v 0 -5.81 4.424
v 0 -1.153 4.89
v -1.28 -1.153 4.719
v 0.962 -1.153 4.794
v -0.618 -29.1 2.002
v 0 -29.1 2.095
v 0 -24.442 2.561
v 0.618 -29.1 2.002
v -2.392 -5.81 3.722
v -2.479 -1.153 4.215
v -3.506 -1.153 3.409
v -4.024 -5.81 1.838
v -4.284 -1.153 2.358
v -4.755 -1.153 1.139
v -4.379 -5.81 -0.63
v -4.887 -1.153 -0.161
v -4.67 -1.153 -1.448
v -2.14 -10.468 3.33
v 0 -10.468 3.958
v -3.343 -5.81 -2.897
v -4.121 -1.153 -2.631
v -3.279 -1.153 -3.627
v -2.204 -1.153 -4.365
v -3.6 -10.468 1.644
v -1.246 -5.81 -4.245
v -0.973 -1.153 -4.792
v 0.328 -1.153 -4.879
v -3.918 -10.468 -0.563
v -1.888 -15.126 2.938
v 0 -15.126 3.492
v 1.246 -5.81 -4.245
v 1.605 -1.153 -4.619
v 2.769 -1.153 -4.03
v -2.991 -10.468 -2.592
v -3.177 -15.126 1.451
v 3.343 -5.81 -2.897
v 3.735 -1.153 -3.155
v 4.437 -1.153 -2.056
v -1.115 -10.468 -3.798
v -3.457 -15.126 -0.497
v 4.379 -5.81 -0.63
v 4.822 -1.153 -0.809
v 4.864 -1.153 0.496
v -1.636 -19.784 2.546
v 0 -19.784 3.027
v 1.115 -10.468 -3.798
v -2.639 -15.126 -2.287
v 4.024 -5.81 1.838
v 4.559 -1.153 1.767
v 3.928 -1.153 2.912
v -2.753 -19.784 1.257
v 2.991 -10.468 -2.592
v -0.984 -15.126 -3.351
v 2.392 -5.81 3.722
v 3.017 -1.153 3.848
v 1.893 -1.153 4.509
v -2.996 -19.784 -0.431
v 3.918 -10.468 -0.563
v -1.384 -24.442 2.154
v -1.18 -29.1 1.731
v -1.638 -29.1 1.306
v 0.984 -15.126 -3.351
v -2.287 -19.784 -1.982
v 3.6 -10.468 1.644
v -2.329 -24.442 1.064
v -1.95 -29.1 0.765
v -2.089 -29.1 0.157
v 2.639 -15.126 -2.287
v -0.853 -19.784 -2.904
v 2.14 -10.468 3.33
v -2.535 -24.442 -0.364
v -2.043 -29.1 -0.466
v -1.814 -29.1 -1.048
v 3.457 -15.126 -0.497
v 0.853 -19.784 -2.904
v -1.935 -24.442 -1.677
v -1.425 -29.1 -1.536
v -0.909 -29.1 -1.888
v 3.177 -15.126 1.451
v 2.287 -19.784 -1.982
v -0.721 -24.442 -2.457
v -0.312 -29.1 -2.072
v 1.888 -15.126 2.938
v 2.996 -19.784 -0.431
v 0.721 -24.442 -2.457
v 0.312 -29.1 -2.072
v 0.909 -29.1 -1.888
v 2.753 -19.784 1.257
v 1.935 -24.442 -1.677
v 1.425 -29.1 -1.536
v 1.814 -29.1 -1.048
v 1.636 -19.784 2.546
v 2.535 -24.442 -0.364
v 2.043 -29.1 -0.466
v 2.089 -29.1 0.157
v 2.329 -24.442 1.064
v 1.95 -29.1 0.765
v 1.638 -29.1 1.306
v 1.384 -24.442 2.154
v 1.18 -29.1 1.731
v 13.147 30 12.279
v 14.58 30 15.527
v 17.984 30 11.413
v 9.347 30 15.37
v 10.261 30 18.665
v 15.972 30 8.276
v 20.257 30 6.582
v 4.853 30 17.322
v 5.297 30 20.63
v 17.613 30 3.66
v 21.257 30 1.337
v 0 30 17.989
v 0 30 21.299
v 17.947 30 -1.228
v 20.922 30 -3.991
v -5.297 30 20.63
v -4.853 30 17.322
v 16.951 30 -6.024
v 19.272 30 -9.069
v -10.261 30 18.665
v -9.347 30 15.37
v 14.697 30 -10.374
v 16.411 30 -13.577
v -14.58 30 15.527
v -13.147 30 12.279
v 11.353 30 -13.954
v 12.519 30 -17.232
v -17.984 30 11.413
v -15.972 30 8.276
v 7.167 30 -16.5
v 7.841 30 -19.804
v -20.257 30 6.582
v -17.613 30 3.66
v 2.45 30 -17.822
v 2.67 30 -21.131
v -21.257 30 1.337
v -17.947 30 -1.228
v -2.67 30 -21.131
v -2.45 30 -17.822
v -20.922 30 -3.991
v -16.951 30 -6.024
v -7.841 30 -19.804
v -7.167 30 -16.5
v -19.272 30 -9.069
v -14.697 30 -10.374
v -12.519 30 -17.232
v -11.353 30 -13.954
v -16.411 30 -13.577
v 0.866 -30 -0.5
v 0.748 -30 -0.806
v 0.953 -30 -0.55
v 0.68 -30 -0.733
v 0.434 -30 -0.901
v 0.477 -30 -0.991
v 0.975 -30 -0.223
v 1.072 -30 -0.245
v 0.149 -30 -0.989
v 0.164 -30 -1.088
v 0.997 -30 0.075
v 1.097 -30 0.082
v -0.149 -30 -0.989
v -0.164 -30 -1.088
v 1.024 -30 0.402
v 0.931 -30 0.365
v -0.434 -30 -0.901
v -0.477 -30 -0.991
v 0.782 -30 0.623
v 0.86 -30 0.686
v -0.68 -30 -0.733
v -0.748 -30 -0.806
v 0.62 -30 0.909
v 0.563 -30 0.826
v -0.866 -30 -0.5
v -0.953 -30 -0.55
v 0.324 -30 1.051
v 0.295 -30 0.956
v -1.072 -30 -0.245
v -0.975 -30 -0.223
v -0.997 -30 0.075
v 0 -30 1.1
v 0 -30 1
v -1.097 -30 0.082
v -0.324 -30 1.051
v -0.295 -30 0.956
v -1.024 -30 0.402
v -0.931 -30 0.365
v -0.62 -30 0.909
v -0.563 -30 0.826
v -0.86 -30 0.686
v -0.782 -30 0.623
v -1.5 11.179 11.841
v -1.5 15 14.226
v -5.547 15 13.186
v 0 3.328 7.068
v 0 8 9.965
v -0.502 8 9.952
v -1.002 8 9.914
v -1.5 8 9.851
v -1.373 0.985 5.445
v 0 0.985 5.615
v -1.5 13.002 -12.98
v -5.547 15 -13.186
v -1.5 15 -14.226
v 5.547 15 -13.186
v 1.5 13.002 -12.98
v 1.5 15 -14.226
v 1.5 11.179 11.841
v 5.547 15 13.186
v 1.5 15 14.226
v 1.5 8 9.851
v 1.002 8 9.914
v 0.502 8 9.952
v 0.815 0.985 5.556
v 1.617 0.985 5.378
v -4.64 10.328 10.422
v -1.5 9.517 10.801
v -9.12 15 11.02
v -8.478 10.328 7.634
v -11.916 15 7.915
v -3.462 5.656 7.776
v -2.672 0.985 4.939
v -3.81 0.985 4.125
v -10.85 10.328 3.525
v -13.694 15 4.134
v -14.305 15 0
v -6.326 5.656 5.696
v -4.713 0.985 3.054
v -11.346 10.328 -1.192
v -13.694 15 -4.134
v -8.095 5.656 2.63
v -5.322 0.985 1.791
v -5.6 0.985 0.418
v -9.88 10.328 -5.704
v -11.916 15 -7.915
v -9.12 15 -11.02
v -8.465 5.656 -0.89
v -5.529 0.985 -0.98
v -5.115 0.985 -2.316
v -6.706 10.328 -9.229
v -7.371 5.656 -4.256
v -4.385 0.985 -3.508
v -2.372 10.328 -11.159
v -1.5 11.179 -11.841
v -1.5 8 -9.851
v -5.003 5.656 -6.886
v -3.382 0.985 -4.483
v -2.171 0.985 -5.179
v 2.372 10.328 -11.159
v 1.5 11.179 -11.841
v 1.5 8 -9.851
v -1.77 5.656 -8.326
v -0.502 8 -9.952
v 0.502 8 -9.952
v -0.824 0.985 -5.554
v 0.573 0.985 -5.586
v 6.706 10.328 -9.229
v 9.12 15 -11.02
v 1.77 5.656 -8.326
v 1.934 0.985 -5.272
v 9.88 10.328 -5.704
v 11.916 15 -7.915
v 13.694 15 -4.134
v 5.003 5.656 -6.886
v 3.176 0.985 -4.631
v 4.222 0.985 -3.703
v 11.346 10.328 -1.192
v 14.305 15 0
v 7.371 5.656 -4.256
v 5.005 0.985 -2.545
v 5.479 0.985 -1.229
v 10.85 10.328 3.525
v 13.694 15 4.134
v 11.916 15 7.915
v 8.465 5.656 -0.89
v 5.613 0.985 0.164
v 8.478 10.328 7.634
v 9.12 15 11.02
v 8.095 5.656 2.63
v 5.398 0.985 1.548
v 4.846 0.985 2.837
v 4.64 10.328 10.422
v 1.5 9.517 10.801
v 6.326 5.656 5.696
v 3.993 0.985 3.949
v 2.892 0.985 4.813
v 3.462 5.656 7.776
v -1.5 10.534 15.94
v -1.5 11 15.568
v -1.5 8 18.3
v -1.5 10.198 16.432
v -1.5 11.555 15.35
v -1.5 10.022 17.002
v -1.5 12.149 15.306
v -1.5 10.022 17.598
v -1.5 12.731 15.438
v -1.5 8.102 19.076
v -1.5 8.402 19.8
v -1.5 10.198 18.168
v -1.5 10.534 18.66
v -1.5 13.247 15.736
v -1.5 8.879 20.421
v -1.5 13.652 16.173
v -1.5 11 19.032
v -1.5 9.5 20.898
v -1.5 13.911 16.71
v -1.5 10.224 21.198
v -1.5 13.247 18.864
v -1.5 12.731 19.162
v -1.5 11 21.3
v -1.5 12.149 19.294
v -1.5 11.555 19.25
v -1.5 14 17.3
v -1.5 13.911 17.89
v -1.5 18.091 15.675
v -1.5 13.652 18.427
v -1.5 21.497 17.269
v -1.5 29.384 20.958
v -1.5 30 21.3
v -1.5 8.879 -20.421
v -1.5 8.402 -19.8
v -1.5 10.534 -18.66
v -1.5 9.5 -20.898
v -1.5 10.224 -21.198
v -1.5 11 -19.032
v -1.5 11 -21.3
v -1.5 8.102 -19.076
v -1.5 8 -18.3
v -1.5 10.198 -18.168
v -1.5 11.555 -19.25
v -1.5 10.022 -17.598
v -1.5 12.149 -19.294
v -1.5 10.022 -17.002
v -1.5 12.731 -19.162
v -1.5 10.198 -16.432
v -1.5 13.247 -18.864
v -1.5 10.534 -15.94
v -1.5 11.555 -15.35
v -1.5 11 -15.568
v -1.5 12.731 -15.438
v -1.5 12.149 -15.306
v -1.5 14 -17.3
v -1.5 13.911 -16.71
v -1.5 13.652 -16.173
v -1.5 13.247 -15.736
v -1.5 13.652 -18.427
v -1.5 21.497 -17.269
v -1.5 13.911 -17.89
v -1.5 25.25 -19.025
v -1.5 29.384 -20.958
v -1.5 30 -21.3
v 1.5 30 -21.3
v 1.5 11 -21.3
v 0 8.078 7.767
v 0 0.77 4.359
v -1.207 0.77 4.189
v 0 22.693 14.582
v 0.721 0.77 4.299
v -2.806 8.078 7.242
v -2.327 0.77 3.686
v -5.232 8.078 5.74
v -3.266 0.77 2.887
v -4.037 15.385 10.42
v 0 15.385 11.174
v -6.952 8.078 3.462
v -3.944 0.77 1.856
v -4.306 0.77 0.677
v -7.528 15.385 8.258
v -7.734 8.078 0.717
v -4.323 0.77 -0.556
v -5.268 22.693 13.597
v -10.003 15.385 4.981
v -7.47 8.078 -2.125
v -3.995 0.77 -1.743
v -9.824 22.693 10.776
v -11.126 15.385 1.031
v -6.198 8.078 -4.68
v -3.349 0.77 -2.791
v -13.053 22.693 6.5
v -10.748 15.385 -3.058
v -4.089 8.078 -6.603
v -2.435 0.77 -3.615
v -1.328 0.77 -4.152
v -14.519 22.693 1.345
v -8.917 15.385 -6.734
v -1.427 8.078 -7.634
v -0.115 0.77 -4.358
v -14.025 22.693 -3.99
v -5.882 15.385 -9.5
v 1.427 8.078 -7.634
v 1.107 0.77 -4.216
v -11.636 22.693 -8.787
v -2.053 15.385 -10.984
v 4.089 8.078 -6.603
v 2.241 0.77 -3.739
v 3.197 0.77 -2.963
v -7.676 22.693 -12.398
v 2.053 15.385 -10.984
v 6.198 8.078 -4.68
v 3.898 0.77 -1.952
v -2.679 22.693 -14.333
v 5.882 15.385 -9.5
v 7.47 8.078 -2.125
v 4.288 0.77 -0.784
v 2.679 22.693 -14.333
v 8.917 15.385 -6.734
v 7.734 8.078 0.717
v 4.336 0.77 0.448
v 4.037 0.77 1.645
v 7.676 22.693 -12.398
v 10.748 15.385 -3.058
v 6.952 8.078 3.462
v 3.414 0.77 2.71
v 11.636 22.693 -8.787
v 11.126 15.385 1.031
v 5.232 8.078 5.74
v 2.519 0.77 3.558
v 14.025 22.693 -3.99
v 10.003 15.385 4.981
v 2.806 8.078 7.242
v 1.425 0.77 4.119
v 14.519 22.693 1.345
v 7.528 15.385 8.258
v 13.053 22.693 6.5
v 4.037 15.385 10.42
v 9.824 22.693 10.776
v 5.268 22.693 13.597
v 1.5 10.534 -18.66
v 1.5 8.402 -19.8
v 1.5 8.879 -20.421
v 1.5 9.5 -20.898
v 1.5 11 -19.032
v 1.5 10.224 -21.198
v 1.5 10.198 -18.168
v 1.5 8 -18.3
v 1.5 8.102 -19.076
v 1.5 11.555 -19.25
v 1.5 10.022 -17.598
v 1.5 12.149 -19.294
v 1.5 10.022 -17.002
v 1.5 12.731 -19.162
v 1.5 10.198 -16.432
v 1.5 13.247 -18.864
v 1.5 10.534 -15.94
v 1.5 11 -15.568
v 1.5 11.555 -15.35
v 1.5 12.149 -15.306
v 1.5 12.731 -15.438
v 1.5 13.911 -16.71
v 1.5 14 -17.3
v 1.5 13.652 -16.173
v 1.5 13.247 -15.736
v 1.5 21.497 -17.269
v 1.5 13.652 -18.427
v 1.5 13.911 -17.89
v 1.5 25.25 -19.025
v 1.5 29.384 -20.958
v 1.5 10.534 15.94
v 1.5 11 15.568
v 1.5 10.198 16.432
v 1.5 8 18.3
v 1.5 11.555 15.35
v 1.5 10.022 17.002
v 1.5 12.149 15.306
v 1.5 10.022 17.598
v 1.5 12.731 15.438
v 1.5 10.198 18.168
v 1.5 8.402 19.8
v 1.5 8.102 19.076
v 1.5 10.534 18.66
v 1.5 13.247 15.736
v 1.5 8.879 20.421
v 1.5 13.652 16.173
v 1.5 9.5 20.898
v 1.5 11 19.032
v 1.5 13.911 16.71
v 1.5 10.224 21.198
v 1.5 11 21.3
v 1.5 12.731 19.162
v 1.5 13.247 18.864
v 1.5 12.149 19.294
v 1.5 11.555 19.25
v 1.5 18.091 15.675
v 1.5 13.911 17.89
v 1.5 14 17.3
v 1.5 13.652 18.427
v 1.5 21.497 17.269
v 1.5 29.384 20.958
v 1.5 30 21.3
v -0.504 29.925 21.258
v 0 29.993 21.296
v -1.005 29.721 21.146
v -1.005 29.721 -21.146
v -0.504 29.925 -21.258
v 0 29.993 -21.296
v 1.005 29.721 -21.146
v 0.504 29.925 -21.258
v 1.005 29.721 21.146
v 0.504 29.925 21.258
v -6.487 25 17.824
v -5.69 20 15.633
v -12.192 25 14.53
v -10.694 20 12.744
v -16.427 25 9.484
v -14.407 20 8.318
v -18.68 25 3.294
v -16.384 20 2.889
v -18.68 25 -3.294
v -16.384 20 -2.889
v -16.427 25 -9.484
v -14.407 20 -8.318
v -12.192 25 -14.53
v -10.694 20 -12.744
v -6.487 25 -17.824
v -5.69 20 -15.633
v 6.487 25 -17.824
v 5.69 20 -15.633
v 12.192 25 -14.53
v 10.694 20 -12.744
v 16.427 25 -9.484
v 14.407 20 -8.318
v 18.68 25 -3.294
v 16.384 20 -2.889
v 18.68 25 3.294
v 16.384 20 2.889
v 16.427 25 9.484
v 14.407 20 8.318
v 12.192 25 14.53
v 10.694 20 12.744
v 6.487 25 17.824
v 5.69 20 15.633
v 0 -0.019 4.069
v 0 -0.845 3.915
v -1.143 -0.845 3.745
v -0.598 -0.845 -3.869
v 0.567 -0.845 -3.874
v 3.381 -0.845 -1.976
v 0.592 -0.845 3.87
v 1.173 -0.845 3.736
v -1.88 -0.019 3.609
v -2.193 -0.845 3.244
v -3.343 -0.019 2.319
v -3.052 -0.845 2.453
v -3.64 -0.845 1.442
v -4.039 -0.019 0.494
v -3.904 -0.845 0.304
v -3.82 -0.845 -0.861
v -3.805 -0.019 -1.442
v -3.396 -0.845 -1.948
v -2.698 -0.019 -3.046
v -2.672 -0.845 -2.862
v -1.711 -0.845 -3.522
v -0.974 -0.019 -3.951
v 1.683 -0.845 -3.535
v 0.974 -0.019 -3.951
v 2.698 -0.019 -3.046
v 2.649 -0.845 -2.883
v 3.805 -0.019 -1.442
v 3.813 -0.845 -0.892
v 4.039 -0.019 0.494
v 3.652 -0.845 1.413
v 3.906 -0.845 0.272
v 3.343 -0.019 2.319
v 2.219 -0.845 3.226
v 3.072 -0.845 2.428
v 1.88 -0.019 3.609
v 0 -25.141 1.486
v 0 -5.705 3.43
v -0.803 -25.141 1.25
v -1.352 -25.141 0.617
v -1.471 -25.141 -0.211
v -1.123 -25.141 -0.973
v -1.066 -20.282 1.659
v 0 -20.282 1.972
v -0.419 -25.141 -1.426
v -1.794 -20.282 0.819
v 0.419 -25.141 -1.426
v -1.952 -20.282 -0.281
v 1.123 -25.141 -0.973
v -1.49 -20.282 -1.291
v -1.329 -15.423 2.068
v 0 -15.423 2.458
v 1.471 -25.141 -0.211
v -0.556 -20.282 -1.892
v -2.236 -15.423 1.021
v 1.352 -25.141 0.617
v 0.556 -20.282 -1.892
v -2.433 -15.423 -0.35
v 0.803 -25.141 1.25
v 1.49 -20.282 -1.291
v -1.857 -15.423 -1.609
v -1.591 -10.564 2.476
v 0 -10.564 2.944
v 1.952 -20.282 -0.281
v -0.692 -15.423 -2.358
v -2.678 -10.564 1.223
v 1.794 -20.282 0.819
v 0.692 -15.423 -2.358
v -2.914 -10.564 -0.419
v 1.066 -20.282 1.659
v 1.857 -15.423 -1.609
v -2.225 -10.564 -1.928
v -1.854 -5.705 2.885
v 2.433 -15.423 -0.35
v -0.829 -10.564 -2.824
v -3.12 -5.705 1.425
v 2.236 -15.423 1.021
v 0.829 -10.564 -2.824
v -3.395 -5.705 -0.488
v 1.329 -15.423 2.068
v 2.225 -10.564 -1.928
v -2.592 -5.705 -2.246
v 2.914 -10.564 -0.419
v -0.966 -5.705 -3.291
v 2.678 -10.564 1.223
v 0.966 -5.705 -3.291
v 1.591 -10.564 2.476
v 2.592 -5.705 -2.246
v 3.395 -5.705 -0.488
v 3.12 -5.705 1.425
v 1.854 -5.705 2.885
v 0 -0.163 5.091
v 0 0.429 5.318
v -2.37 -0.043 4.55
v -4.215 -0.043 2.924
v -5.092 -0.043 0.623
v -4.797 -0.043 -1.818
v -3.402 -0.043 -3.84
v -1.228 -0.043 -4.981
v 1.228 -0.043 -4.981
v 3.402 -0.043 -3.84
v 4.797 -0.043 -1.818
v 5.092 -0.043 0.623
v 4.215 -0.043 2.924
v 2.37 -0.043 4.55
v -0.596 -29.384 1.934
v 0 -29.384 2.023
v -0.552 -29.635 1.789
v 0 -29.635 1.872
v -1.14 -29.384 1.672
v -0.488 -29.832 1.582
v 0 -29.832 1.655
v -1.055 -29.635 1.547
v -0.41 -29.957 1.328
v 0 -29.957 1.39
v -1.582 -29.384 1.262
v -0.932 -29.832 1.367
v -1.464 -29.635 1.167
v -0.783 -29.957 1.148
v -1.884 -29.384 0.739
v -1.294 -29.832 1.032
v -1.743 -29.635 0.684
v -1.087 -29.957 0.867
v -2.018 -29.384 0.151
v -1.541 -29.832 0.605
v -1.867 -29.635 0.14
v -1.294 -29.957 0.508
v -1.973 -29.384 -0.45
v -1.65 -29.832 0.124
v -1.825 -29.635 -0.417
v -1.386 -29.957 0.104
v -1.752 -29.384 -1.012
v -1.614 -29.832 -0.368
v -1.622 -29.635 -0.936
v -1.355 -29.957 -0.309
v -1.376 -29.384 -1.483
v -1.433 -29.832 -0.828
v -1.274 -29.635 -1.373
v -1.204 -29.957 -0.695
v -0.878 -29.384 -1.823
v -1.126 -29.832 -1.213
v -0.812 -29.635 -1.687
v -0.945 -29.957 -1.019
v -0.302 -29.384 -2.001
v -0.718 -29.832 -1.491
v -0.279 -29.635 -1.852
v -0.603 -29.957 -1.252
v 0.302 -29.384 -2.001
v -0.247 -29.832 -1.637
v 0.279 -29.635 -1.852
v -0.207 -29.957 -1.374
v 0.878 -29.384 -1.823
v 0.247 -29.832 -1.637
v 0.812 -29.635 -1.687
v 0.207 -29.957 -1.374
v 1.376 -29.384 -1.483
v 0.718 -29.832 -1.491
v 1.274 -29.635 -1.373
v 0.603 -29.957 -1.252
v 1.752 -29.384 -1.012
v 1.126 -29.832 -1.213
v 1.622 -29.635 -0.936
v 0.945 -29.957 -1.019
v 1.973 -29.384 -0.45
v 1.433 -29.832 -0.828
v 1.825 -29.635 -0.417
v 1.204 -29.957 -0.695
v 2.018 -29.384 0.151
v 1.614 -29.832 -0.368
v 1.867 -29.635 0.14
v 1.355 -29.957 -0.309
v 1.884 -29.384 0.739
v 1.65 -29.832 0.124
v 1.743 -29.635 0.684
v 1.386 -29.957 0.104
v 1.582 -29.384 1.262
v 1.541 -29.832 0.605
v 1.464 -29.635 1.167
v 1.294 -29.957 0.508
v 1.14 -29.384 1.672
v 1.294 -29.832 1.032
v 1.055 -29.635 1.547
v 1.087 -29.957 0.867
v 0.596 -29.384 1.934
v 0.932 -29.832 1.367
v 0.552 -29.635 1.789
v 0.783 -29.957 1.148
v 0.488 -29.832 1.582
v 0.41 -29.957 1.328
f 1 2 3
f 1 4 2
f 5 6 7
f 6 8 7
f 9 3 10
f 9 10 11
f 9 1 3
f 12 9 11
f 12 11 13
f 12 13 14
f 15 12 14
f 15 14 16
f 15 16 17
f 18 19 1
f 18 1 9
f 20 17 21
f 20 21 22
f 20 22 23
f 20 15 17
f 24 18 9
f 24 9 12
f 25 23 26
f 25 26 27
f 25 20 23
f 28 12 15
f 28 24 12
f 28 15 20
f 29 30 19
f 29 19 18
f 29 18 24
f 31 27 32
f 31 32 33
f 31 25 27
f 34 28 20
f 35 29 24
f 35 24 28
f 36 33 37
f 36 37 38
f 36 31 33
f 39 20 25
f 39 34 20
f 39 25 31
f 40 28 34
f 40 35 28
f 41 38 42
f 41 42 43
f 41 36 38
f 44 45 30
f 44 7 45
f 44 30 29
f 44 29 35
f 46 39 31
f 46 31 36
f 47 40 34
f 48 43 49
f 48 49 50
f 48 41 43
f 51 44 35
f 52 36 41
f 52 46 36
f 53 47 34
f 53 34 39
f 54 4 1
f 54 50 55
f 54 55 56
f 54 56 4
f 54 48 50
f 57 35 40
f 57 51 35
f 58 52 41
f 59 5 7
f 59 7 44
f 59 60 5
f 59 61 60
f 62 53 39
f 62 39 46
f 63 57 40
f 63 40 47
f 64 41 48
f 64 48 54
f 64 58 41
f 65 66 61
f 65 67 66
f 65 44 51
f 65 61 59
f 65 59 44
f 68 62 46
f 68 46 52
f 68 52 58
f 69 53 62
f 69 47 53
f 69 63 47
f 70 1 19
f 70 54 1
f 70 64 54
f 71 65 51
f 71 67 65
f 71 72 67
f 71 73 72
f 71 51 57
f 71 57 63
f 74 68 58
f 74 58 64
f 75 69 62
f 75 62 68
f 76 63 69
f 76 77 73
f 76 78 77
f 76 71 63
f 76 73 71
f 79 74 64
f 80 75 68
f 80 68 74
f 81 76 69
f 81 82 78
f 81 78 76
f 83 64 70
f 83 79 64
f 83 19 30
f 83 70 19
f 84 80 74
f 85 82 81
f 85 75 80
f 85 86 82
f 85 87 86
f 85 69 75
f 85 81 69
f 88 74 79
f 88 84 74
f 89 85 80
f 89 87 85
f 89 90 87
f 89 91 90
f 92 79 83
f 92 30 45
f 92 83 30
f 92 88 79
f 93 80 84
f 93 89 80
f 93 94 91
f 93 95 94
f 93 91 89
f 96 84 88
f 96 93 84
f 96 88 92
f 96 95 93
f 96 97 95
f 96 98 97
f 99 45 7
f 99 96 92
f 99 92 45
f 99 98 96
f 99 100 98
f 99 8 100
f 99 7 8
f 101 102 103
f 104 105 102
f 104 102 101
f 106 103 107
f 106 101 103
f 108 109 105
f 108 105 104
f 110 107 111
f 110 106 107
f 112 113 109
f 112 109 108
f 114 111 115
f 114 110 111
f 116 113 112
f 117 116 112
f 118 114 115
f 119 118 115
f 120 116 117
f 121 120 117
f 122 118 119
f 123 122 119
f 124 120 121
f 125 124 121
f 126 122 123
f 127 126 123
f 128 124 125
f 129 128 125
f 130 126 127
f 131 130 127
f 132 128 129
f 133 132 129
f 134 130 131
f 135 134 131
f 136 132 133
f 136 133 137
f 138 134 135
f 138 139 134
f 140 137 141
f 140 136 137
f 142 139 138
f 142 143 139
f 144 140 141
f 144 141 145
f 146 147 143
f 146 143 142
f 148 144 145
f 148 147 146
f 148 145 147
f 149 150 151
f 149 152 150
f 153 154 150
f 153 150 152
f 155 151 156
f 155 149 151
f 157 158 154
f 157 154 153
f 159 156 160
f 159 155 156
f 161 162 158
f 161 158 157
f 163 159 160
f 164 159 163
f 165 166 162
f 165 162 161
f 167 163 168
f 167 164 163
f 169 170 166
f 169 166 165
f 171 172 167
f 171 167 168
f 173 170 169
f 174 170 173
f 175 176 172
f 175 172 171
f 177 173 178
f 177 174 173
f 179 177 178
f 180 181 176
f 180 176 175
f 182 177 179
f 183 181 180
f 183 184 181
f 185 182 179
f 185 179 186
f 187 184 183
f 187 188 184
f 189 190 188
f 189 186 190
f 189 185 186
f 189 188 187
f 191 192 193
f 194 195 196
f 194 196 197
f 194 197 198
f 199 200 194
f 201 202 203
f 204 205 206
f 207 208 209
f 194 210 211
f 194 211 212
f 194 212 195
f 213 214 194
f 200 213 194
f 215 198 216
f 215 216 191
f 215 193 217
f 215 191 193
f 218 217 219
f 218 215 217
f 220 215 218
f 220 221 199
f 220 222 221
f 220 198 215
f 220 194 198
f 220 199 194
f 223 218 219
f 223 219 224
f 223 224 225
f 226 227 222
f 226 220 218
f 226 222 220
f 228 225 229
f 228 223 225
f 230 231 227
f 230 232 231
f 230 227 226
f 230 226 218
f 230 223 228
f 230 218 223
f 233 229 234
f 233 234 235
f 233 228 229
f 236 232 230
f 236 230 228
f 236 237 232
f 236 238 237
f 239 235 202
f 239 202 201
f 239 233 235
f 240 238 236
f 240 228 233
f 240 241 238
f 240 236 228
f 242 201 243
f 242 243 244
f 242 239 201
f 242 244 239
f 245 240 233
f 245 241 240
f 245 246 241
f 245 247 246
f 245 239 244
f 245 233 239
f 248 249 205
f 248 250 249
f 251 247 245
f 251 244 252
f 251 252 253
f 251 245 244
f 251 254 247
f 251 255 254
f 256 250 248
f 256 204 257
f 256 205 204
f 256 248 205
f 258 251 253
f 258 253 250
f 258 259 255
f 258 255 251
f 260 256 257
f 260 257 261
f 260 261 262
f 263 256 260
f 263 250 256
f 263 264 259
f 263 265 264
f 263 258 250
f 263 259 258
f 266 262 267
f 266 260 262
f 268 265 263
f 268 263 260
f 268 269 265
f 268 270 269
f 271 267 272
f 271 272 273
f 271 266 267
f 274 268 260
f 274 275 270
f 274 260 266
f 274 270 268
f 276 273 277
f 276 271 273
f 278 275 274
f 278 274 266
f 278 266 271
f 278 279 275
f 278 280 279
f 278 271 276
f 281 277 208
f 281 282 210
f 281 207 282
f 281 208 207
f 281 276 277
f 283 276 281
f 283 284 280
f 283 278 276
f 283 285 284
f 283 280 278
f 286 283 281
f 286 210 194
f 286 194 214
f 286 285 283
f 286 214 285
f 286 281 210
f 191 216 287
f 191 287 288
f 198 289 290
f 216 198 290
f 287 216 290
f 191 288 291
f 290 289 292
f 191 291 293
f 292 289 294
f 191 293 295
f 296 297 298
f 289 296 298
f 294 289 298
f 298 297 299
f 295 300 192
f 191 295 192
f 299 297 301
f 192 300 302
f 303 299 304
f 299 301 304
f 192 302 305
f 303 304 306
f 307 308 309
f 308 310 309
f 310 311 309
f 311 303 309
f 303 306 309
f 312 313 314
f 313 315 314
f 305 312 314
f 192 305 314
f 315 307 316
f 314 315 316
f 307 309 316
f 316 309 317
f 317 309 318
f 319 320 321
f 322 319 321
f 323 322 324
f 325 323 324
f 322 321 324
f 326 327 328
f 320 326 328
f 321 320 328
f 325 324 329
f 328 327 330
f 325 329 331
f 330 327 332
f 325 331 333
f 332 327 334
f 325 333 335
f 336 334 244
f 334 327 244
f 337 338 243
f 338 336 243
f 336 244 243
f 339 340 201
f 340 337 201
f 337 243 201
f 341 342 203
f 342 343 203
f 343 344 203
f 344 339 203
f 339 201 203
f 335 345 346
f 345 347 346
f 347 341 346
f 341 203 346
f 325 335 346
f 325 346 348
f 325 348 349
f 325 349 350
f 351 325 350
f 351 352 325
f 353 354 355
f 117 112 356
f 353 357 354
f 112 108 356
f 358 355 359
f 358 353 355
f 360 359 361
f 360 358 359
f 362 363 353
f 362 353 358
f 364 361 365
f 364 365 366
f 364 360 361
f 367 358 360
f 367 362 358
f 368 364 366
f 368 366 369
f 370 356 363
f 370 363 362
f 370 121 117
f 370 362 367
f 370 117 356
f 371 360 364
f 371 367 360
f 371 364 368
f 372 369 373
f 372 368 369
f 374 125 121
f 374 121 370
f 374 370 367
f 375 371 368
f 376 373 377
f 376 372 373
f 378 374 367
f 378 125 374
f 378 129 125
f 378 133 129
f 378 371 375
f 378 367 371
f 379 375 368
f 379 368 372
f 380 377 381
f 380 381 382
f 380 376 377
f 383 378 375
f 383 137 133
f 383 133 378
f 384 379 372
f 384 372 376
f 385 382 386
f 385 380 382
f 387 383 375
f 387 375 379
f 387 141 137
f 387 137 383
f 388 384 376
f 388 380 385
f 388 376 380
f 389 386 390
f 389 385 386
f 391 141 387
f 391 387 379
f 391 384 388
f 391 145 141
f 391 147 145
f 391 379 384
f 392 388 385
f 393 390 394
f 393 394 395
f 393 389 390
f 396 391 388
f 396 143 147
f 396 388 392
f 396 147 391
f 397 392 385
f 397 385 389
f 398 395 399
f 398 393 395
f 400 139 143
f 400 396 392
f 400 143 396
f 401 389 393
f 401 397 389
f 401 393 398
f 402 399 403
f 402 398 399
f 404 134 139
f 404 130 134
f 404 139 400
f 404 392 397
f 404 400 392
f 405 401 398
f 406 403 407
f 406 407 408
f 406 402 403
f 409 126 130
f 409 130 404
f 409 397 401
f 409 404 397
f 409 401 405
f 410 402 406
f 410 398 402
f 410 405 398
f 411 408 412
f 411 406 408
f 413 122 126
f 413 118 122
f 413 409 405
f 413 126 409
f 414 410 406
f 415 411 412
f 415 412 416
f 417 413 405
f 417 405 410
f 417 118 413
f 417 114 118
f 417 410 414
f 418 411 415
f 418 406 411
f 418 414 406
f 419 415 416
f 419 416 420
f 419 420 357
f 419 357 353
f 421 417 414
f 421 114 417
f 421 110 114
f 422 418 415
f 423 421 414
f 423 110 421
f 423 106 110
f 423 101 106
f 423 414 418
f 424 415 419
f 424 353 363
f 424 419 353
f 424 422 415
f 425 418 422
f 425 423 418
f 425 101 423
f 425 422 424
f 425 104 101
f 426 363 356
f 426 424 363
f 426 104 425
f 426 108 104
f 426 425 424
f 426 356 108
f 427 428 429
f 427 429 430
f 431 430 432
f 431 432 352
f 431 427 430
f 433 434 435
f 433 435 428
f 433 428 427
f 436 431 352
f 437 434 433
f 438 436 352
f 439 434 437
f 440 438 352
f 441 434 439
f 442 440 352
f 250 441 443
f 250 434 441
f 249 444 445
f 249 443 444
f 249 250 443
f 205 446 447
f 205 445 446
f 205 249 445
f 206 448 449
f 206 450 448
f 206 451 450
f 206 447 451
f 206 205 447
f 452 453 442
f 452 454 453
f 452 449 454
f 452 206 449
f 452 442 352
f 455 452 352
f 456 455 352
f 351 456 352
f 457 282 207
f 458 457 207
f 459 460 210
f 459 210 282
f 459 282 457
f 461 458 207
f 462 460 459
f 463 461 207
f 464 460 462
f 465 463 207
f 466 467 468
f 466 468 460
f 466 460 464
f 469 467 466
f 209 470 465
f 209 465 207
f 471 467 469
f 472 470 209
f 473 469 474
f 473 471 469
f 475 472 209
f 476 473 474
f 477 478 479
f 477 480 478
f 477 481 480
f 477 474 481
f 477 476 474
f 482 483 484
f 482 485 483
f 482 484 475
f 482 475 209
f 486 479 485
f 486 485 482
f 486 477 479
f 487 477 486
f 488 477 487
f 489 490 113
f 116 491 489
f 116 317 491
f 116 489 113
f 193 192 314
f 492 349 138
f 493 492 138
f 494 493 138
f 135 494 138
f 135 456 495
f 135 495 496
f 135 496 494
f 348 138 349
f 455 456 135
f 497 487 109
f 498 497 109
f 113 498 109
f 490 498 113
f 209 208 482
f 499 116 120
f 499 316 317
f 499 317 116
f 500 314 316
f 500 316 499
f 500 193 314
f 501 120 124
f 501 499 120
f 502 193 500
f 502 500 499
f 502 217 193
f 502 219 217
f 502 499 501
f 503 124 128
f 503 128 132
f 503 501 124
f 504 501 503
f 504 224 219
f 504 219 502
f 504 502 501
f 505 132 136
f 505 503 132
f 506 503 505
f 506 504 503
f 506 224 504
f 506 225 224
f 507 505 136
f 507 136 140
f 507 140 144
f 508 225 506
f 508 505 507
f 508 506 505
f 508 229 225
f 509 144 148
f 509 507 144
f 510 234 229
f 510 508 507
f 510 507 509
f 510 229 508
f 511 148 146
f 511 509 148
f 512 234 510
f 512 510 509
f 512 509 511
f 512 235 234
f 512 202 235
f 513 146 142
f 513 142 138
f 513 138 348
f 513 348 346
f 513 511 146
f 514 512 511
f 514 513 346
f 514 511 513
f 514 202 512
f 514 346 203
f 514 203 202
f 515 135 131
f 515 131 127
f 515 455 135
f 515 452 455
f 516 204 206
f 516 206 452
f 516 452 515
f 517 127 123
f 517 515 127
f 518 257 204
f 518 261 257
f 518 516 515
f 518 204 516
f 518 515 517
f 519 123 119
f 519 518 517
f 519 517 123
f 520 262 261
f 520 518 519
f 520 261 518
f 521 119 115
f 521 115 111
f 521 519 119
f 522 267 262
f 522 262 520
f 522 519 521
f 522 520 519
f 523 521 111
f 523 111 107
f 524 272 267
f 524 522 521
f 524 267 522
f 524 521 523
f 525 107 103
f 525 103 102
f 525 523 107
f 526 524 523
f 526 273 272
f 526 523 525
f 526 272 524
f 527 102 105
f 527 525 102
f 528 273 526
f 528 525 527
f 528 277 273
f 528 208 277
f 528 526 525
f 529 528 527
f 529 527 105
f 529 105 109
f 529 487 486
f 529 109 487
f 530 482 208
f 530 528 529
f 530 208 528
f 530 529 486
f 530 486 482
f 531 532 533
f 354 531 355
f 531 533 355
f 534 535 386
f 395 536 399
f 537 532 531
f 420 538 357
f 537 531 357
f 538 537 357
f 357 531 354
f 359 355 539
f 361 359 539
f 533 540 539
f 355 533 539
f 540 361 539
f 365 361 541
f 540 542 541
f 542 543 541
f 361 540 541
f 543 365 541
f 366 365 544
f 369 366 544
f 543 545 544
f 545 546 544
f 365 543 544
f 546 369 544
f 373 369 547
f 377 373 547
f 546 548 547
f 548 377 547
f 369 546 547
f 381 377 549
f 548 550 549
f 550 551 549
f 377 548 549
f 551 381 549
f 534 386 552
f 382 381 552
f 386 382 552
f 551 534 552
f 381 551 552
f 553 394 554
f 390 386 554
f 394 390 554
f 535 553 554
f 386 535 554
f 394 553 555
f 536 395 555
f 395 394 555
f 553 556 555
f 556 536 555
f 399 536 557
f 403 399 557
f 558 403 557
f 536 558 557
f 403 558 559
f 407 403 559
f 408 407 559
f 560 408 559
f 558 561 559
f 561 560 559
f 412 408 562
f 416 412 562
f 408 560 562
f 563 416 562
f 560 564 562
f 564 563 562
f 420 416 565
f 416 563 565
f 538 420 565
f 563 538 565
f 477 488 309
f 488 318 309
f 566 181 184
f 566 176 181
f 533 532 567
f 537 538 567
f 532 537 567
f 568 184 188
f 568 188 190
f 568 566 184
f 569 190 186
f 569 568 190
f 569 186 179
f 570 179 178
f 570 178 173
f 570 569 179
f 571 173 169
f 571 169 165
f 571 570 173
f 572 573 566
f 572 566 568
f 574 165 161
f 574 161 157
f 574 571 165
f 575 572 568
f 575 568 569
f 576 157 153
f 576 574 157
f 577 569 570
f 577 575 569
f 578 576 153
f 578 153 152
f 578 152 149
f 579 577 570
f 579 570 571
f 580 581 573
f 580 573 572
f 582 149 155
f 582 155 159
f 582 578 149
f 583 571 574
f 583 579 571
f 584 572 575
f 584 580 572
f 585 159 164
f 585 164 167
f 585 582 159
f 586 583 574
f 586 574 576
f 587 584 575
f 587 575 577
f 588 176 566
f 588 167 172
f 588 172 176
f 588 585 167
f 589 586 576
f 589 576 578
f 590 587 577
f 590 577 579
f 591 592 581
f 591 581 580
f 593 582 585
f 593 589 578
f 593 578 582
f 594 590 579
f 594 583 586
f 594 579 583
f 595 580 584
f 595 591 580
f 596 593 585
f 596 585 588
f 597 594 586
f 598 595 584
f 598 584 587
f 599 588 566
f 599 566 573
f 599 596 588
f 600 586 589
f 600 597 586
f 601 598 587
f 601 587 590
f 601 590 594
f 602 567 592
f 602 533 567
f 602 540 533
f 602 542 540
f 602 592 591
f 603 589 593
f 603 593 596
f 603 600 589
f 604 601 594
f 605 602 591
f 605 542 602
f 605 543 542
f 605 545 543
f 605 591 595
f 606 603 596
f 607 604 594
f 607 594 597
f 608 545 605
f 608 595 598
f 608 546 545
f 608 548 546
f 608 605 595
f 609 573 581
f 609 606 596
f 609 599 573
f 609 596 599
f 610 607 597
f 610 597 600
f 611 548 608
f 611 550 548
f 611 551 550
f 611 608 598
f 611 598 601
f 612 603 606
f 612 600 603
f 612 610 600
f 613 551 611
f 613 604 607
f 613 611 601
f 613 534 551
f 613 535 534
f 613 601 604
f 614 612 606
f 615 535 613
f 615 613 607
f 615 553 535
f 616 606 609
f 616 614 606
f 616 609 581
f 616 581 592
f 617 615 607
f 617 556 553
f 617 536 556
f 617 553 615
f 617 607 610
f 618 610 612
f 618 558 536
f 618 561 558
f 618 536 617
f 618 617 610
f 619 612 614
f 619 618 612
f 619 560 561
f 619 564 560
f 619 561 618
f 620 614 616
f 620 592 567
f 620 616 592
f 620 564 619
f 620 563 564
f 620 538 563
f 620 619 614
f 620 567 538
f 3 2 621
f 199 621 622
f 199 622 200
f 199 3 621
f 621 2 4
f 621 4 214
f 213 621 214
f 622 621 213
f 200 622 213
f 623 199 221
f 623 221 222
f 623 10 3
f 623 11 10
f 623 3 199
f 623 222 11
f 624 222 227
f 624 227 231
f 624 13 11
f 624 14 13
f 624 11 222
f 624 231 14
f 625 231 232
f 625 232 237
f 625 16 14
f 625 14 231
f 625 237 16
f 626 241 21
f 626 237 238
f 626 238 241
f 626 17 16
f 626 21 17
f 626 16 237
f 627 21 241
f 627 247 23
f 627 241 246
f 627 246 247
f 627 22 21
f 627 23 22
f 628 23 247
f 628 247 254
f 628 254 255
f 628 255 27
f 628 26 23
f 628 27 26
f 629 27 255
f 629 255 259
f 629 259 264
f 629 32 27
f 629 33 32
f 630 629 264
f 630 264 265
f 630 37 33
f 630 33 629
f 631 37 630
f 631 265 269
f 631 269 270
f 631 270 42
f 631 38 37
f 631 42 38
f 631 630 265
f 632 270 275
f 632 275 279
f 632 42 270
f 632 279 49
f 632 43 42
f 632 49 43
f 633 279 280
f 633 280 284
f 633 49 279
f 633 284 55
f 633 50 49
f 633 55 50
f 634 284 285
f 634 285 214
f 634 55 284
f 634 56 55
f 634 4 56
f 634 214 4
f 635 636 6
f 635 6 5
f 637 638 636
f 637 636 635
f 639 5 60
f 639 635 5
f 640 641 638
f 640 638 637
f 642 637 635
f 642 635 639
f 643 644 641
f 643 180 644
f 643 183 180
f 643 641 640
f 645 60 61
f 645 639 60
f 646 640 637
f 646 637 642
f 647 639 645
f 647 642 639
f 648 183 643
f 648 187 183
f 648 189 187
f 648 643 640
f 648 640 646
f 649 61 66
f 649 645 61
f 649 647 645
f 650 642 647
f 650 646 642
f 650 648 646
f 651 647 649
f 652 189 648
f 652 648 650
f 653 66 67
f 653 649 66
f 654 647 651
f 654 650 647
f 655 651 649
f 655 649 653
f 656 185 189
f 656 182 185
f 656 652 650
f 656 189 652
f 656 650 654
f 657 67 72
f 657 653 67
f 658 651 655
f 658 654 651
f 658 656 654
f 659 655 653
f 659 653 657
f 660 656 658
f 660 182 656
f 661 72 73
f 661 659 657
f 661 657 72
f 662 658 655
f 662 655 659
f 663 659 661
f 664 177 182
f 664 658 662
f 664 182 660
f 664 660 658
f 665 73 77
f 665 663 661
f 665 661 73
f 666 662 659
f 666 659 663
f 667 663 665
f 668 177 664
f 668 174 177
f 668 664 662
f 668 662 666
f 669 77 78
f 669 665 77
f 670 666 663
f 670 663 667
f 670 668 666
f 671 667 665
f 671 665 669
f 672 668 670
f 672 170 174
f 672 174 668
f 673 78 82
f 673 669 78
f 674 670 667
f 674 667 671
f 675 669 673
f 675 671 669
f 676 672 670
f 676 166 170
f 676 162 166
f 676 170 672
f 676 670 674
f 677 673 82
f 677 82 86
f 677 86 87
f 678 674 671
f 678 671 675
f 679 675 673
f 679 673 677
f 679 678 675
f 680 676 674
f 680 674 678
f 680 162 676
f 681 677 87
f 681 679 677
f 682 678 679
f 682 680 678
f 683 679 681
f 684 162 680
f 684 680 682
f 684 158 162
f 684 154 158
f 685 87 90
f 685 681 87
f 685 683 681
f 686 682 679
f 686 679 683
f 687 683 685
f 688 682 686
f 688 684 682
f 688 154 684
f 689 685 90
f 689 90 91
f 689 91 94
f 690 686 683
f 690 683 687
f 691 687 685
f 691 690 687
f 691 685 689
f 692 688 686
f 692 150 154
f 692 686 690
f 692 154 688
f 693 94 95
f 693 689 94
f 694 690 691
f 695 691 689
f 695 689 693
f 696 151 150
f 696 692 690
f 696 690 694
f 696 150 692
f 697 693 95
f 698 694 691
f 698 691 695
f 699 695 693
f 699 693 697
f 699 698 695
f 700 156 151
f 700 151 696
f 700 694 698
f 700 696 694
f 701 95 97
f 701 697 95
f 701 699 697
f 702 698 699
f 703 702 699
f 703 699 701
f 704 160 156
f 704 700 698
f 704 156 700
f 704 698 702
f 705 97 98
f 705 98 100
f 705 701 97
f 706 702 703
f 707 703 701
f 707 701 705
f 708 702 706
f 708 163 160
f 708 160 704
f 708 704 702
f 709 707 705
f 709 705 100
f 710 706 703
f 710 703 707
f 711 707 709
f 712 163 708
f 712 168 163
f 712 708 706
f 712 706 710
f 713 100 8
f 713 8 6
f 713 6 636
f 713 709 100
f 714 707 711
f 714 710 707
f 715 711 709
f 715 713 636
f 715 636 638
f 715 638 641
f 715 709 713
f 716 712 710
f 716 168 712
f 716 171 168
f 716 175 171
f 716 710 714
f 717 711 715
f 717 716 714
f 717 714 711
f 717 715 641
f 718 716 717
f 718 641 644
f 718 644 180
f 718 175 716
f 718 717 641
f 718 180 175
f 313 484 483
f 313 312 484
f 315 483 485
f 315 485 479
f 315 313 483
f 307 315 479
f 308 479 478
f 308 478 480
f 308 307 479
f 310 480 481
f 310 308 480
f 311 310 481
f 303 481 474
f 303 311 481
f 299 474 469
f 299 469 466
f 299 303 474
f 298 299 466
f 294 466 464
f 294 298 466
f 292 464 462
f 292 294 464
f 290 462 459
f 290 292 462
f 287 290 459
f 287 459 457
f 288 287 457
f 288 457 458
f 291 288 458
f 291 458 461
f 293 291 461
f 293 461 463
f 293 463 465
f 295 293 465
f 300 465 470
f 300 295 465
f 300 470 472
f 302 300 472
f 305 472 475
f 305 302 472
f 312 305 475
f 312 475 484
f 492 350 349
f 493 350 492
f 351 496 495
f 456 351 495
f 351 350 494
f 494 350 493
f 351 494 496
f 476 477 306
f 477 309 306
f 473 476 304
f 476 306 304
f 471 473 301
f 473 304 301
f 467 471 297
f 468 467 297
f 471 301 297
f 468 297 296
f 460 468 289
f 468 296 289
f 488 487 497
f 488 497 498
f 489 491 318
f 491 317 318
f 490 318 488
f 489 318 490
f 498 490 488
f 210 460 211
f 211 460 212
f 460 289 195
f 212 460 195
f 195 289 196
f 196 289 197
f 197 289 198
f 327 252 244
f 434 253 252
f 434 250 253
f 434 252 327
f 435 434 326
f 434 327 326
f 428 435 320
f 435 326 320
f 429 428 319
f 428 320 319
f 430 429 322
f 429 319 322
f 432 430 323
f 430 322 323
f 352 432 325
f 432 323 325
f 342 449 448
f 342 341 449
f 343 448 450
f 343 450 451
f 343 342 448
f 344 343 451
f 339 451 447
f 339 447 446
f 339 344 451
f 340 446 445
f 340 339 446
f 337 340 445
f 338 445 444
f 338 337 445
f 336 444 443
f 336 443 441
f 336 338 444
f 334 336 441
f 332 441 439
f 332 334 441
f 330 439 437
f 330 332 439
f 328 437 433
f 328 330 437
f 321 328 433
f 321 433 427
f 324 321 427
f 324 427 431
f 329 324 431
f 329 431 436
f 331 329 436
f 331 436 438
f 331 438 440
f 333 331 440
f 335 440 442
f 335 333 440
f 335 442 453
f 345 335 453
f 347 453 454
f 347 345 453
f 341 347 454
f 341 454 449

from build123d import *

# Parameters (mm, degrees)
F2_R     = 2
F3_DEPTH = 1.5
F4_R     = 1
F5_R     = 5
F6_R     = 5
F7_R     = 3


with BuildPart() as f1:
    # F0 (on Right) → F1 (revolve)
    with BuildSketch(Plane.YZ):
        Polygon((-30, 2.004988), (-30, 1), (0, 4), (15, 10.994615), (30, 17.98923), (30, 21.299364), (15, 14.304749), (0, 5.004988), align=None)
    revolve(axis=Axis((0, -9.670749, 0), (0, -1, 0)))

    # F2 (on Right) → F3 (join, symmetric)
    with BuildSketch(Plane.YZ):
        Polygon((8, 9.105201), (30, 21.3), (8, 21.3), align=None)
        with Locations((12, 17.3)):
            Circle(F2_R, mode=Mode.SUBTRACT)
        Polygon((8, -21.3), (30, -21.3), (8, -9.105201), align=None)
        with Locations((12, -17.3)):
            Circle(F2_R, mode=Mode.SUBTRACT)
    extrude(amount=F3_DEPTH, both=True)

    # F4
    f4_edges = [f1.edges().sort_by_distance(p)[0] for p in [
        (0, -30, -2.004988),
    ]]
    fillet(f4_edges, radius=F4_R)

    # F5
    f5_edges = [f1.edges().sort_by_distance(p)[0] for p in [
        (0, 0, -5.004988),
    ]]
    fillet(f5_edges, radius=F5_R)

    # F6
    f6_edges = [f1.edges().sort_by_distance(p)[0] for p in [
        (0, 0, -4),
    ]]
    fillet(f6_edges, radius=F6_R)

    # F7
    f7_edges = [f1.edges().sort_by_distance(p)[0] for p in [
        (0, 8, 21.3),
        (0, 8, -21.3),
    ]]
    fillet(f7_edges, radius=F7_R)


solid = f1.part
